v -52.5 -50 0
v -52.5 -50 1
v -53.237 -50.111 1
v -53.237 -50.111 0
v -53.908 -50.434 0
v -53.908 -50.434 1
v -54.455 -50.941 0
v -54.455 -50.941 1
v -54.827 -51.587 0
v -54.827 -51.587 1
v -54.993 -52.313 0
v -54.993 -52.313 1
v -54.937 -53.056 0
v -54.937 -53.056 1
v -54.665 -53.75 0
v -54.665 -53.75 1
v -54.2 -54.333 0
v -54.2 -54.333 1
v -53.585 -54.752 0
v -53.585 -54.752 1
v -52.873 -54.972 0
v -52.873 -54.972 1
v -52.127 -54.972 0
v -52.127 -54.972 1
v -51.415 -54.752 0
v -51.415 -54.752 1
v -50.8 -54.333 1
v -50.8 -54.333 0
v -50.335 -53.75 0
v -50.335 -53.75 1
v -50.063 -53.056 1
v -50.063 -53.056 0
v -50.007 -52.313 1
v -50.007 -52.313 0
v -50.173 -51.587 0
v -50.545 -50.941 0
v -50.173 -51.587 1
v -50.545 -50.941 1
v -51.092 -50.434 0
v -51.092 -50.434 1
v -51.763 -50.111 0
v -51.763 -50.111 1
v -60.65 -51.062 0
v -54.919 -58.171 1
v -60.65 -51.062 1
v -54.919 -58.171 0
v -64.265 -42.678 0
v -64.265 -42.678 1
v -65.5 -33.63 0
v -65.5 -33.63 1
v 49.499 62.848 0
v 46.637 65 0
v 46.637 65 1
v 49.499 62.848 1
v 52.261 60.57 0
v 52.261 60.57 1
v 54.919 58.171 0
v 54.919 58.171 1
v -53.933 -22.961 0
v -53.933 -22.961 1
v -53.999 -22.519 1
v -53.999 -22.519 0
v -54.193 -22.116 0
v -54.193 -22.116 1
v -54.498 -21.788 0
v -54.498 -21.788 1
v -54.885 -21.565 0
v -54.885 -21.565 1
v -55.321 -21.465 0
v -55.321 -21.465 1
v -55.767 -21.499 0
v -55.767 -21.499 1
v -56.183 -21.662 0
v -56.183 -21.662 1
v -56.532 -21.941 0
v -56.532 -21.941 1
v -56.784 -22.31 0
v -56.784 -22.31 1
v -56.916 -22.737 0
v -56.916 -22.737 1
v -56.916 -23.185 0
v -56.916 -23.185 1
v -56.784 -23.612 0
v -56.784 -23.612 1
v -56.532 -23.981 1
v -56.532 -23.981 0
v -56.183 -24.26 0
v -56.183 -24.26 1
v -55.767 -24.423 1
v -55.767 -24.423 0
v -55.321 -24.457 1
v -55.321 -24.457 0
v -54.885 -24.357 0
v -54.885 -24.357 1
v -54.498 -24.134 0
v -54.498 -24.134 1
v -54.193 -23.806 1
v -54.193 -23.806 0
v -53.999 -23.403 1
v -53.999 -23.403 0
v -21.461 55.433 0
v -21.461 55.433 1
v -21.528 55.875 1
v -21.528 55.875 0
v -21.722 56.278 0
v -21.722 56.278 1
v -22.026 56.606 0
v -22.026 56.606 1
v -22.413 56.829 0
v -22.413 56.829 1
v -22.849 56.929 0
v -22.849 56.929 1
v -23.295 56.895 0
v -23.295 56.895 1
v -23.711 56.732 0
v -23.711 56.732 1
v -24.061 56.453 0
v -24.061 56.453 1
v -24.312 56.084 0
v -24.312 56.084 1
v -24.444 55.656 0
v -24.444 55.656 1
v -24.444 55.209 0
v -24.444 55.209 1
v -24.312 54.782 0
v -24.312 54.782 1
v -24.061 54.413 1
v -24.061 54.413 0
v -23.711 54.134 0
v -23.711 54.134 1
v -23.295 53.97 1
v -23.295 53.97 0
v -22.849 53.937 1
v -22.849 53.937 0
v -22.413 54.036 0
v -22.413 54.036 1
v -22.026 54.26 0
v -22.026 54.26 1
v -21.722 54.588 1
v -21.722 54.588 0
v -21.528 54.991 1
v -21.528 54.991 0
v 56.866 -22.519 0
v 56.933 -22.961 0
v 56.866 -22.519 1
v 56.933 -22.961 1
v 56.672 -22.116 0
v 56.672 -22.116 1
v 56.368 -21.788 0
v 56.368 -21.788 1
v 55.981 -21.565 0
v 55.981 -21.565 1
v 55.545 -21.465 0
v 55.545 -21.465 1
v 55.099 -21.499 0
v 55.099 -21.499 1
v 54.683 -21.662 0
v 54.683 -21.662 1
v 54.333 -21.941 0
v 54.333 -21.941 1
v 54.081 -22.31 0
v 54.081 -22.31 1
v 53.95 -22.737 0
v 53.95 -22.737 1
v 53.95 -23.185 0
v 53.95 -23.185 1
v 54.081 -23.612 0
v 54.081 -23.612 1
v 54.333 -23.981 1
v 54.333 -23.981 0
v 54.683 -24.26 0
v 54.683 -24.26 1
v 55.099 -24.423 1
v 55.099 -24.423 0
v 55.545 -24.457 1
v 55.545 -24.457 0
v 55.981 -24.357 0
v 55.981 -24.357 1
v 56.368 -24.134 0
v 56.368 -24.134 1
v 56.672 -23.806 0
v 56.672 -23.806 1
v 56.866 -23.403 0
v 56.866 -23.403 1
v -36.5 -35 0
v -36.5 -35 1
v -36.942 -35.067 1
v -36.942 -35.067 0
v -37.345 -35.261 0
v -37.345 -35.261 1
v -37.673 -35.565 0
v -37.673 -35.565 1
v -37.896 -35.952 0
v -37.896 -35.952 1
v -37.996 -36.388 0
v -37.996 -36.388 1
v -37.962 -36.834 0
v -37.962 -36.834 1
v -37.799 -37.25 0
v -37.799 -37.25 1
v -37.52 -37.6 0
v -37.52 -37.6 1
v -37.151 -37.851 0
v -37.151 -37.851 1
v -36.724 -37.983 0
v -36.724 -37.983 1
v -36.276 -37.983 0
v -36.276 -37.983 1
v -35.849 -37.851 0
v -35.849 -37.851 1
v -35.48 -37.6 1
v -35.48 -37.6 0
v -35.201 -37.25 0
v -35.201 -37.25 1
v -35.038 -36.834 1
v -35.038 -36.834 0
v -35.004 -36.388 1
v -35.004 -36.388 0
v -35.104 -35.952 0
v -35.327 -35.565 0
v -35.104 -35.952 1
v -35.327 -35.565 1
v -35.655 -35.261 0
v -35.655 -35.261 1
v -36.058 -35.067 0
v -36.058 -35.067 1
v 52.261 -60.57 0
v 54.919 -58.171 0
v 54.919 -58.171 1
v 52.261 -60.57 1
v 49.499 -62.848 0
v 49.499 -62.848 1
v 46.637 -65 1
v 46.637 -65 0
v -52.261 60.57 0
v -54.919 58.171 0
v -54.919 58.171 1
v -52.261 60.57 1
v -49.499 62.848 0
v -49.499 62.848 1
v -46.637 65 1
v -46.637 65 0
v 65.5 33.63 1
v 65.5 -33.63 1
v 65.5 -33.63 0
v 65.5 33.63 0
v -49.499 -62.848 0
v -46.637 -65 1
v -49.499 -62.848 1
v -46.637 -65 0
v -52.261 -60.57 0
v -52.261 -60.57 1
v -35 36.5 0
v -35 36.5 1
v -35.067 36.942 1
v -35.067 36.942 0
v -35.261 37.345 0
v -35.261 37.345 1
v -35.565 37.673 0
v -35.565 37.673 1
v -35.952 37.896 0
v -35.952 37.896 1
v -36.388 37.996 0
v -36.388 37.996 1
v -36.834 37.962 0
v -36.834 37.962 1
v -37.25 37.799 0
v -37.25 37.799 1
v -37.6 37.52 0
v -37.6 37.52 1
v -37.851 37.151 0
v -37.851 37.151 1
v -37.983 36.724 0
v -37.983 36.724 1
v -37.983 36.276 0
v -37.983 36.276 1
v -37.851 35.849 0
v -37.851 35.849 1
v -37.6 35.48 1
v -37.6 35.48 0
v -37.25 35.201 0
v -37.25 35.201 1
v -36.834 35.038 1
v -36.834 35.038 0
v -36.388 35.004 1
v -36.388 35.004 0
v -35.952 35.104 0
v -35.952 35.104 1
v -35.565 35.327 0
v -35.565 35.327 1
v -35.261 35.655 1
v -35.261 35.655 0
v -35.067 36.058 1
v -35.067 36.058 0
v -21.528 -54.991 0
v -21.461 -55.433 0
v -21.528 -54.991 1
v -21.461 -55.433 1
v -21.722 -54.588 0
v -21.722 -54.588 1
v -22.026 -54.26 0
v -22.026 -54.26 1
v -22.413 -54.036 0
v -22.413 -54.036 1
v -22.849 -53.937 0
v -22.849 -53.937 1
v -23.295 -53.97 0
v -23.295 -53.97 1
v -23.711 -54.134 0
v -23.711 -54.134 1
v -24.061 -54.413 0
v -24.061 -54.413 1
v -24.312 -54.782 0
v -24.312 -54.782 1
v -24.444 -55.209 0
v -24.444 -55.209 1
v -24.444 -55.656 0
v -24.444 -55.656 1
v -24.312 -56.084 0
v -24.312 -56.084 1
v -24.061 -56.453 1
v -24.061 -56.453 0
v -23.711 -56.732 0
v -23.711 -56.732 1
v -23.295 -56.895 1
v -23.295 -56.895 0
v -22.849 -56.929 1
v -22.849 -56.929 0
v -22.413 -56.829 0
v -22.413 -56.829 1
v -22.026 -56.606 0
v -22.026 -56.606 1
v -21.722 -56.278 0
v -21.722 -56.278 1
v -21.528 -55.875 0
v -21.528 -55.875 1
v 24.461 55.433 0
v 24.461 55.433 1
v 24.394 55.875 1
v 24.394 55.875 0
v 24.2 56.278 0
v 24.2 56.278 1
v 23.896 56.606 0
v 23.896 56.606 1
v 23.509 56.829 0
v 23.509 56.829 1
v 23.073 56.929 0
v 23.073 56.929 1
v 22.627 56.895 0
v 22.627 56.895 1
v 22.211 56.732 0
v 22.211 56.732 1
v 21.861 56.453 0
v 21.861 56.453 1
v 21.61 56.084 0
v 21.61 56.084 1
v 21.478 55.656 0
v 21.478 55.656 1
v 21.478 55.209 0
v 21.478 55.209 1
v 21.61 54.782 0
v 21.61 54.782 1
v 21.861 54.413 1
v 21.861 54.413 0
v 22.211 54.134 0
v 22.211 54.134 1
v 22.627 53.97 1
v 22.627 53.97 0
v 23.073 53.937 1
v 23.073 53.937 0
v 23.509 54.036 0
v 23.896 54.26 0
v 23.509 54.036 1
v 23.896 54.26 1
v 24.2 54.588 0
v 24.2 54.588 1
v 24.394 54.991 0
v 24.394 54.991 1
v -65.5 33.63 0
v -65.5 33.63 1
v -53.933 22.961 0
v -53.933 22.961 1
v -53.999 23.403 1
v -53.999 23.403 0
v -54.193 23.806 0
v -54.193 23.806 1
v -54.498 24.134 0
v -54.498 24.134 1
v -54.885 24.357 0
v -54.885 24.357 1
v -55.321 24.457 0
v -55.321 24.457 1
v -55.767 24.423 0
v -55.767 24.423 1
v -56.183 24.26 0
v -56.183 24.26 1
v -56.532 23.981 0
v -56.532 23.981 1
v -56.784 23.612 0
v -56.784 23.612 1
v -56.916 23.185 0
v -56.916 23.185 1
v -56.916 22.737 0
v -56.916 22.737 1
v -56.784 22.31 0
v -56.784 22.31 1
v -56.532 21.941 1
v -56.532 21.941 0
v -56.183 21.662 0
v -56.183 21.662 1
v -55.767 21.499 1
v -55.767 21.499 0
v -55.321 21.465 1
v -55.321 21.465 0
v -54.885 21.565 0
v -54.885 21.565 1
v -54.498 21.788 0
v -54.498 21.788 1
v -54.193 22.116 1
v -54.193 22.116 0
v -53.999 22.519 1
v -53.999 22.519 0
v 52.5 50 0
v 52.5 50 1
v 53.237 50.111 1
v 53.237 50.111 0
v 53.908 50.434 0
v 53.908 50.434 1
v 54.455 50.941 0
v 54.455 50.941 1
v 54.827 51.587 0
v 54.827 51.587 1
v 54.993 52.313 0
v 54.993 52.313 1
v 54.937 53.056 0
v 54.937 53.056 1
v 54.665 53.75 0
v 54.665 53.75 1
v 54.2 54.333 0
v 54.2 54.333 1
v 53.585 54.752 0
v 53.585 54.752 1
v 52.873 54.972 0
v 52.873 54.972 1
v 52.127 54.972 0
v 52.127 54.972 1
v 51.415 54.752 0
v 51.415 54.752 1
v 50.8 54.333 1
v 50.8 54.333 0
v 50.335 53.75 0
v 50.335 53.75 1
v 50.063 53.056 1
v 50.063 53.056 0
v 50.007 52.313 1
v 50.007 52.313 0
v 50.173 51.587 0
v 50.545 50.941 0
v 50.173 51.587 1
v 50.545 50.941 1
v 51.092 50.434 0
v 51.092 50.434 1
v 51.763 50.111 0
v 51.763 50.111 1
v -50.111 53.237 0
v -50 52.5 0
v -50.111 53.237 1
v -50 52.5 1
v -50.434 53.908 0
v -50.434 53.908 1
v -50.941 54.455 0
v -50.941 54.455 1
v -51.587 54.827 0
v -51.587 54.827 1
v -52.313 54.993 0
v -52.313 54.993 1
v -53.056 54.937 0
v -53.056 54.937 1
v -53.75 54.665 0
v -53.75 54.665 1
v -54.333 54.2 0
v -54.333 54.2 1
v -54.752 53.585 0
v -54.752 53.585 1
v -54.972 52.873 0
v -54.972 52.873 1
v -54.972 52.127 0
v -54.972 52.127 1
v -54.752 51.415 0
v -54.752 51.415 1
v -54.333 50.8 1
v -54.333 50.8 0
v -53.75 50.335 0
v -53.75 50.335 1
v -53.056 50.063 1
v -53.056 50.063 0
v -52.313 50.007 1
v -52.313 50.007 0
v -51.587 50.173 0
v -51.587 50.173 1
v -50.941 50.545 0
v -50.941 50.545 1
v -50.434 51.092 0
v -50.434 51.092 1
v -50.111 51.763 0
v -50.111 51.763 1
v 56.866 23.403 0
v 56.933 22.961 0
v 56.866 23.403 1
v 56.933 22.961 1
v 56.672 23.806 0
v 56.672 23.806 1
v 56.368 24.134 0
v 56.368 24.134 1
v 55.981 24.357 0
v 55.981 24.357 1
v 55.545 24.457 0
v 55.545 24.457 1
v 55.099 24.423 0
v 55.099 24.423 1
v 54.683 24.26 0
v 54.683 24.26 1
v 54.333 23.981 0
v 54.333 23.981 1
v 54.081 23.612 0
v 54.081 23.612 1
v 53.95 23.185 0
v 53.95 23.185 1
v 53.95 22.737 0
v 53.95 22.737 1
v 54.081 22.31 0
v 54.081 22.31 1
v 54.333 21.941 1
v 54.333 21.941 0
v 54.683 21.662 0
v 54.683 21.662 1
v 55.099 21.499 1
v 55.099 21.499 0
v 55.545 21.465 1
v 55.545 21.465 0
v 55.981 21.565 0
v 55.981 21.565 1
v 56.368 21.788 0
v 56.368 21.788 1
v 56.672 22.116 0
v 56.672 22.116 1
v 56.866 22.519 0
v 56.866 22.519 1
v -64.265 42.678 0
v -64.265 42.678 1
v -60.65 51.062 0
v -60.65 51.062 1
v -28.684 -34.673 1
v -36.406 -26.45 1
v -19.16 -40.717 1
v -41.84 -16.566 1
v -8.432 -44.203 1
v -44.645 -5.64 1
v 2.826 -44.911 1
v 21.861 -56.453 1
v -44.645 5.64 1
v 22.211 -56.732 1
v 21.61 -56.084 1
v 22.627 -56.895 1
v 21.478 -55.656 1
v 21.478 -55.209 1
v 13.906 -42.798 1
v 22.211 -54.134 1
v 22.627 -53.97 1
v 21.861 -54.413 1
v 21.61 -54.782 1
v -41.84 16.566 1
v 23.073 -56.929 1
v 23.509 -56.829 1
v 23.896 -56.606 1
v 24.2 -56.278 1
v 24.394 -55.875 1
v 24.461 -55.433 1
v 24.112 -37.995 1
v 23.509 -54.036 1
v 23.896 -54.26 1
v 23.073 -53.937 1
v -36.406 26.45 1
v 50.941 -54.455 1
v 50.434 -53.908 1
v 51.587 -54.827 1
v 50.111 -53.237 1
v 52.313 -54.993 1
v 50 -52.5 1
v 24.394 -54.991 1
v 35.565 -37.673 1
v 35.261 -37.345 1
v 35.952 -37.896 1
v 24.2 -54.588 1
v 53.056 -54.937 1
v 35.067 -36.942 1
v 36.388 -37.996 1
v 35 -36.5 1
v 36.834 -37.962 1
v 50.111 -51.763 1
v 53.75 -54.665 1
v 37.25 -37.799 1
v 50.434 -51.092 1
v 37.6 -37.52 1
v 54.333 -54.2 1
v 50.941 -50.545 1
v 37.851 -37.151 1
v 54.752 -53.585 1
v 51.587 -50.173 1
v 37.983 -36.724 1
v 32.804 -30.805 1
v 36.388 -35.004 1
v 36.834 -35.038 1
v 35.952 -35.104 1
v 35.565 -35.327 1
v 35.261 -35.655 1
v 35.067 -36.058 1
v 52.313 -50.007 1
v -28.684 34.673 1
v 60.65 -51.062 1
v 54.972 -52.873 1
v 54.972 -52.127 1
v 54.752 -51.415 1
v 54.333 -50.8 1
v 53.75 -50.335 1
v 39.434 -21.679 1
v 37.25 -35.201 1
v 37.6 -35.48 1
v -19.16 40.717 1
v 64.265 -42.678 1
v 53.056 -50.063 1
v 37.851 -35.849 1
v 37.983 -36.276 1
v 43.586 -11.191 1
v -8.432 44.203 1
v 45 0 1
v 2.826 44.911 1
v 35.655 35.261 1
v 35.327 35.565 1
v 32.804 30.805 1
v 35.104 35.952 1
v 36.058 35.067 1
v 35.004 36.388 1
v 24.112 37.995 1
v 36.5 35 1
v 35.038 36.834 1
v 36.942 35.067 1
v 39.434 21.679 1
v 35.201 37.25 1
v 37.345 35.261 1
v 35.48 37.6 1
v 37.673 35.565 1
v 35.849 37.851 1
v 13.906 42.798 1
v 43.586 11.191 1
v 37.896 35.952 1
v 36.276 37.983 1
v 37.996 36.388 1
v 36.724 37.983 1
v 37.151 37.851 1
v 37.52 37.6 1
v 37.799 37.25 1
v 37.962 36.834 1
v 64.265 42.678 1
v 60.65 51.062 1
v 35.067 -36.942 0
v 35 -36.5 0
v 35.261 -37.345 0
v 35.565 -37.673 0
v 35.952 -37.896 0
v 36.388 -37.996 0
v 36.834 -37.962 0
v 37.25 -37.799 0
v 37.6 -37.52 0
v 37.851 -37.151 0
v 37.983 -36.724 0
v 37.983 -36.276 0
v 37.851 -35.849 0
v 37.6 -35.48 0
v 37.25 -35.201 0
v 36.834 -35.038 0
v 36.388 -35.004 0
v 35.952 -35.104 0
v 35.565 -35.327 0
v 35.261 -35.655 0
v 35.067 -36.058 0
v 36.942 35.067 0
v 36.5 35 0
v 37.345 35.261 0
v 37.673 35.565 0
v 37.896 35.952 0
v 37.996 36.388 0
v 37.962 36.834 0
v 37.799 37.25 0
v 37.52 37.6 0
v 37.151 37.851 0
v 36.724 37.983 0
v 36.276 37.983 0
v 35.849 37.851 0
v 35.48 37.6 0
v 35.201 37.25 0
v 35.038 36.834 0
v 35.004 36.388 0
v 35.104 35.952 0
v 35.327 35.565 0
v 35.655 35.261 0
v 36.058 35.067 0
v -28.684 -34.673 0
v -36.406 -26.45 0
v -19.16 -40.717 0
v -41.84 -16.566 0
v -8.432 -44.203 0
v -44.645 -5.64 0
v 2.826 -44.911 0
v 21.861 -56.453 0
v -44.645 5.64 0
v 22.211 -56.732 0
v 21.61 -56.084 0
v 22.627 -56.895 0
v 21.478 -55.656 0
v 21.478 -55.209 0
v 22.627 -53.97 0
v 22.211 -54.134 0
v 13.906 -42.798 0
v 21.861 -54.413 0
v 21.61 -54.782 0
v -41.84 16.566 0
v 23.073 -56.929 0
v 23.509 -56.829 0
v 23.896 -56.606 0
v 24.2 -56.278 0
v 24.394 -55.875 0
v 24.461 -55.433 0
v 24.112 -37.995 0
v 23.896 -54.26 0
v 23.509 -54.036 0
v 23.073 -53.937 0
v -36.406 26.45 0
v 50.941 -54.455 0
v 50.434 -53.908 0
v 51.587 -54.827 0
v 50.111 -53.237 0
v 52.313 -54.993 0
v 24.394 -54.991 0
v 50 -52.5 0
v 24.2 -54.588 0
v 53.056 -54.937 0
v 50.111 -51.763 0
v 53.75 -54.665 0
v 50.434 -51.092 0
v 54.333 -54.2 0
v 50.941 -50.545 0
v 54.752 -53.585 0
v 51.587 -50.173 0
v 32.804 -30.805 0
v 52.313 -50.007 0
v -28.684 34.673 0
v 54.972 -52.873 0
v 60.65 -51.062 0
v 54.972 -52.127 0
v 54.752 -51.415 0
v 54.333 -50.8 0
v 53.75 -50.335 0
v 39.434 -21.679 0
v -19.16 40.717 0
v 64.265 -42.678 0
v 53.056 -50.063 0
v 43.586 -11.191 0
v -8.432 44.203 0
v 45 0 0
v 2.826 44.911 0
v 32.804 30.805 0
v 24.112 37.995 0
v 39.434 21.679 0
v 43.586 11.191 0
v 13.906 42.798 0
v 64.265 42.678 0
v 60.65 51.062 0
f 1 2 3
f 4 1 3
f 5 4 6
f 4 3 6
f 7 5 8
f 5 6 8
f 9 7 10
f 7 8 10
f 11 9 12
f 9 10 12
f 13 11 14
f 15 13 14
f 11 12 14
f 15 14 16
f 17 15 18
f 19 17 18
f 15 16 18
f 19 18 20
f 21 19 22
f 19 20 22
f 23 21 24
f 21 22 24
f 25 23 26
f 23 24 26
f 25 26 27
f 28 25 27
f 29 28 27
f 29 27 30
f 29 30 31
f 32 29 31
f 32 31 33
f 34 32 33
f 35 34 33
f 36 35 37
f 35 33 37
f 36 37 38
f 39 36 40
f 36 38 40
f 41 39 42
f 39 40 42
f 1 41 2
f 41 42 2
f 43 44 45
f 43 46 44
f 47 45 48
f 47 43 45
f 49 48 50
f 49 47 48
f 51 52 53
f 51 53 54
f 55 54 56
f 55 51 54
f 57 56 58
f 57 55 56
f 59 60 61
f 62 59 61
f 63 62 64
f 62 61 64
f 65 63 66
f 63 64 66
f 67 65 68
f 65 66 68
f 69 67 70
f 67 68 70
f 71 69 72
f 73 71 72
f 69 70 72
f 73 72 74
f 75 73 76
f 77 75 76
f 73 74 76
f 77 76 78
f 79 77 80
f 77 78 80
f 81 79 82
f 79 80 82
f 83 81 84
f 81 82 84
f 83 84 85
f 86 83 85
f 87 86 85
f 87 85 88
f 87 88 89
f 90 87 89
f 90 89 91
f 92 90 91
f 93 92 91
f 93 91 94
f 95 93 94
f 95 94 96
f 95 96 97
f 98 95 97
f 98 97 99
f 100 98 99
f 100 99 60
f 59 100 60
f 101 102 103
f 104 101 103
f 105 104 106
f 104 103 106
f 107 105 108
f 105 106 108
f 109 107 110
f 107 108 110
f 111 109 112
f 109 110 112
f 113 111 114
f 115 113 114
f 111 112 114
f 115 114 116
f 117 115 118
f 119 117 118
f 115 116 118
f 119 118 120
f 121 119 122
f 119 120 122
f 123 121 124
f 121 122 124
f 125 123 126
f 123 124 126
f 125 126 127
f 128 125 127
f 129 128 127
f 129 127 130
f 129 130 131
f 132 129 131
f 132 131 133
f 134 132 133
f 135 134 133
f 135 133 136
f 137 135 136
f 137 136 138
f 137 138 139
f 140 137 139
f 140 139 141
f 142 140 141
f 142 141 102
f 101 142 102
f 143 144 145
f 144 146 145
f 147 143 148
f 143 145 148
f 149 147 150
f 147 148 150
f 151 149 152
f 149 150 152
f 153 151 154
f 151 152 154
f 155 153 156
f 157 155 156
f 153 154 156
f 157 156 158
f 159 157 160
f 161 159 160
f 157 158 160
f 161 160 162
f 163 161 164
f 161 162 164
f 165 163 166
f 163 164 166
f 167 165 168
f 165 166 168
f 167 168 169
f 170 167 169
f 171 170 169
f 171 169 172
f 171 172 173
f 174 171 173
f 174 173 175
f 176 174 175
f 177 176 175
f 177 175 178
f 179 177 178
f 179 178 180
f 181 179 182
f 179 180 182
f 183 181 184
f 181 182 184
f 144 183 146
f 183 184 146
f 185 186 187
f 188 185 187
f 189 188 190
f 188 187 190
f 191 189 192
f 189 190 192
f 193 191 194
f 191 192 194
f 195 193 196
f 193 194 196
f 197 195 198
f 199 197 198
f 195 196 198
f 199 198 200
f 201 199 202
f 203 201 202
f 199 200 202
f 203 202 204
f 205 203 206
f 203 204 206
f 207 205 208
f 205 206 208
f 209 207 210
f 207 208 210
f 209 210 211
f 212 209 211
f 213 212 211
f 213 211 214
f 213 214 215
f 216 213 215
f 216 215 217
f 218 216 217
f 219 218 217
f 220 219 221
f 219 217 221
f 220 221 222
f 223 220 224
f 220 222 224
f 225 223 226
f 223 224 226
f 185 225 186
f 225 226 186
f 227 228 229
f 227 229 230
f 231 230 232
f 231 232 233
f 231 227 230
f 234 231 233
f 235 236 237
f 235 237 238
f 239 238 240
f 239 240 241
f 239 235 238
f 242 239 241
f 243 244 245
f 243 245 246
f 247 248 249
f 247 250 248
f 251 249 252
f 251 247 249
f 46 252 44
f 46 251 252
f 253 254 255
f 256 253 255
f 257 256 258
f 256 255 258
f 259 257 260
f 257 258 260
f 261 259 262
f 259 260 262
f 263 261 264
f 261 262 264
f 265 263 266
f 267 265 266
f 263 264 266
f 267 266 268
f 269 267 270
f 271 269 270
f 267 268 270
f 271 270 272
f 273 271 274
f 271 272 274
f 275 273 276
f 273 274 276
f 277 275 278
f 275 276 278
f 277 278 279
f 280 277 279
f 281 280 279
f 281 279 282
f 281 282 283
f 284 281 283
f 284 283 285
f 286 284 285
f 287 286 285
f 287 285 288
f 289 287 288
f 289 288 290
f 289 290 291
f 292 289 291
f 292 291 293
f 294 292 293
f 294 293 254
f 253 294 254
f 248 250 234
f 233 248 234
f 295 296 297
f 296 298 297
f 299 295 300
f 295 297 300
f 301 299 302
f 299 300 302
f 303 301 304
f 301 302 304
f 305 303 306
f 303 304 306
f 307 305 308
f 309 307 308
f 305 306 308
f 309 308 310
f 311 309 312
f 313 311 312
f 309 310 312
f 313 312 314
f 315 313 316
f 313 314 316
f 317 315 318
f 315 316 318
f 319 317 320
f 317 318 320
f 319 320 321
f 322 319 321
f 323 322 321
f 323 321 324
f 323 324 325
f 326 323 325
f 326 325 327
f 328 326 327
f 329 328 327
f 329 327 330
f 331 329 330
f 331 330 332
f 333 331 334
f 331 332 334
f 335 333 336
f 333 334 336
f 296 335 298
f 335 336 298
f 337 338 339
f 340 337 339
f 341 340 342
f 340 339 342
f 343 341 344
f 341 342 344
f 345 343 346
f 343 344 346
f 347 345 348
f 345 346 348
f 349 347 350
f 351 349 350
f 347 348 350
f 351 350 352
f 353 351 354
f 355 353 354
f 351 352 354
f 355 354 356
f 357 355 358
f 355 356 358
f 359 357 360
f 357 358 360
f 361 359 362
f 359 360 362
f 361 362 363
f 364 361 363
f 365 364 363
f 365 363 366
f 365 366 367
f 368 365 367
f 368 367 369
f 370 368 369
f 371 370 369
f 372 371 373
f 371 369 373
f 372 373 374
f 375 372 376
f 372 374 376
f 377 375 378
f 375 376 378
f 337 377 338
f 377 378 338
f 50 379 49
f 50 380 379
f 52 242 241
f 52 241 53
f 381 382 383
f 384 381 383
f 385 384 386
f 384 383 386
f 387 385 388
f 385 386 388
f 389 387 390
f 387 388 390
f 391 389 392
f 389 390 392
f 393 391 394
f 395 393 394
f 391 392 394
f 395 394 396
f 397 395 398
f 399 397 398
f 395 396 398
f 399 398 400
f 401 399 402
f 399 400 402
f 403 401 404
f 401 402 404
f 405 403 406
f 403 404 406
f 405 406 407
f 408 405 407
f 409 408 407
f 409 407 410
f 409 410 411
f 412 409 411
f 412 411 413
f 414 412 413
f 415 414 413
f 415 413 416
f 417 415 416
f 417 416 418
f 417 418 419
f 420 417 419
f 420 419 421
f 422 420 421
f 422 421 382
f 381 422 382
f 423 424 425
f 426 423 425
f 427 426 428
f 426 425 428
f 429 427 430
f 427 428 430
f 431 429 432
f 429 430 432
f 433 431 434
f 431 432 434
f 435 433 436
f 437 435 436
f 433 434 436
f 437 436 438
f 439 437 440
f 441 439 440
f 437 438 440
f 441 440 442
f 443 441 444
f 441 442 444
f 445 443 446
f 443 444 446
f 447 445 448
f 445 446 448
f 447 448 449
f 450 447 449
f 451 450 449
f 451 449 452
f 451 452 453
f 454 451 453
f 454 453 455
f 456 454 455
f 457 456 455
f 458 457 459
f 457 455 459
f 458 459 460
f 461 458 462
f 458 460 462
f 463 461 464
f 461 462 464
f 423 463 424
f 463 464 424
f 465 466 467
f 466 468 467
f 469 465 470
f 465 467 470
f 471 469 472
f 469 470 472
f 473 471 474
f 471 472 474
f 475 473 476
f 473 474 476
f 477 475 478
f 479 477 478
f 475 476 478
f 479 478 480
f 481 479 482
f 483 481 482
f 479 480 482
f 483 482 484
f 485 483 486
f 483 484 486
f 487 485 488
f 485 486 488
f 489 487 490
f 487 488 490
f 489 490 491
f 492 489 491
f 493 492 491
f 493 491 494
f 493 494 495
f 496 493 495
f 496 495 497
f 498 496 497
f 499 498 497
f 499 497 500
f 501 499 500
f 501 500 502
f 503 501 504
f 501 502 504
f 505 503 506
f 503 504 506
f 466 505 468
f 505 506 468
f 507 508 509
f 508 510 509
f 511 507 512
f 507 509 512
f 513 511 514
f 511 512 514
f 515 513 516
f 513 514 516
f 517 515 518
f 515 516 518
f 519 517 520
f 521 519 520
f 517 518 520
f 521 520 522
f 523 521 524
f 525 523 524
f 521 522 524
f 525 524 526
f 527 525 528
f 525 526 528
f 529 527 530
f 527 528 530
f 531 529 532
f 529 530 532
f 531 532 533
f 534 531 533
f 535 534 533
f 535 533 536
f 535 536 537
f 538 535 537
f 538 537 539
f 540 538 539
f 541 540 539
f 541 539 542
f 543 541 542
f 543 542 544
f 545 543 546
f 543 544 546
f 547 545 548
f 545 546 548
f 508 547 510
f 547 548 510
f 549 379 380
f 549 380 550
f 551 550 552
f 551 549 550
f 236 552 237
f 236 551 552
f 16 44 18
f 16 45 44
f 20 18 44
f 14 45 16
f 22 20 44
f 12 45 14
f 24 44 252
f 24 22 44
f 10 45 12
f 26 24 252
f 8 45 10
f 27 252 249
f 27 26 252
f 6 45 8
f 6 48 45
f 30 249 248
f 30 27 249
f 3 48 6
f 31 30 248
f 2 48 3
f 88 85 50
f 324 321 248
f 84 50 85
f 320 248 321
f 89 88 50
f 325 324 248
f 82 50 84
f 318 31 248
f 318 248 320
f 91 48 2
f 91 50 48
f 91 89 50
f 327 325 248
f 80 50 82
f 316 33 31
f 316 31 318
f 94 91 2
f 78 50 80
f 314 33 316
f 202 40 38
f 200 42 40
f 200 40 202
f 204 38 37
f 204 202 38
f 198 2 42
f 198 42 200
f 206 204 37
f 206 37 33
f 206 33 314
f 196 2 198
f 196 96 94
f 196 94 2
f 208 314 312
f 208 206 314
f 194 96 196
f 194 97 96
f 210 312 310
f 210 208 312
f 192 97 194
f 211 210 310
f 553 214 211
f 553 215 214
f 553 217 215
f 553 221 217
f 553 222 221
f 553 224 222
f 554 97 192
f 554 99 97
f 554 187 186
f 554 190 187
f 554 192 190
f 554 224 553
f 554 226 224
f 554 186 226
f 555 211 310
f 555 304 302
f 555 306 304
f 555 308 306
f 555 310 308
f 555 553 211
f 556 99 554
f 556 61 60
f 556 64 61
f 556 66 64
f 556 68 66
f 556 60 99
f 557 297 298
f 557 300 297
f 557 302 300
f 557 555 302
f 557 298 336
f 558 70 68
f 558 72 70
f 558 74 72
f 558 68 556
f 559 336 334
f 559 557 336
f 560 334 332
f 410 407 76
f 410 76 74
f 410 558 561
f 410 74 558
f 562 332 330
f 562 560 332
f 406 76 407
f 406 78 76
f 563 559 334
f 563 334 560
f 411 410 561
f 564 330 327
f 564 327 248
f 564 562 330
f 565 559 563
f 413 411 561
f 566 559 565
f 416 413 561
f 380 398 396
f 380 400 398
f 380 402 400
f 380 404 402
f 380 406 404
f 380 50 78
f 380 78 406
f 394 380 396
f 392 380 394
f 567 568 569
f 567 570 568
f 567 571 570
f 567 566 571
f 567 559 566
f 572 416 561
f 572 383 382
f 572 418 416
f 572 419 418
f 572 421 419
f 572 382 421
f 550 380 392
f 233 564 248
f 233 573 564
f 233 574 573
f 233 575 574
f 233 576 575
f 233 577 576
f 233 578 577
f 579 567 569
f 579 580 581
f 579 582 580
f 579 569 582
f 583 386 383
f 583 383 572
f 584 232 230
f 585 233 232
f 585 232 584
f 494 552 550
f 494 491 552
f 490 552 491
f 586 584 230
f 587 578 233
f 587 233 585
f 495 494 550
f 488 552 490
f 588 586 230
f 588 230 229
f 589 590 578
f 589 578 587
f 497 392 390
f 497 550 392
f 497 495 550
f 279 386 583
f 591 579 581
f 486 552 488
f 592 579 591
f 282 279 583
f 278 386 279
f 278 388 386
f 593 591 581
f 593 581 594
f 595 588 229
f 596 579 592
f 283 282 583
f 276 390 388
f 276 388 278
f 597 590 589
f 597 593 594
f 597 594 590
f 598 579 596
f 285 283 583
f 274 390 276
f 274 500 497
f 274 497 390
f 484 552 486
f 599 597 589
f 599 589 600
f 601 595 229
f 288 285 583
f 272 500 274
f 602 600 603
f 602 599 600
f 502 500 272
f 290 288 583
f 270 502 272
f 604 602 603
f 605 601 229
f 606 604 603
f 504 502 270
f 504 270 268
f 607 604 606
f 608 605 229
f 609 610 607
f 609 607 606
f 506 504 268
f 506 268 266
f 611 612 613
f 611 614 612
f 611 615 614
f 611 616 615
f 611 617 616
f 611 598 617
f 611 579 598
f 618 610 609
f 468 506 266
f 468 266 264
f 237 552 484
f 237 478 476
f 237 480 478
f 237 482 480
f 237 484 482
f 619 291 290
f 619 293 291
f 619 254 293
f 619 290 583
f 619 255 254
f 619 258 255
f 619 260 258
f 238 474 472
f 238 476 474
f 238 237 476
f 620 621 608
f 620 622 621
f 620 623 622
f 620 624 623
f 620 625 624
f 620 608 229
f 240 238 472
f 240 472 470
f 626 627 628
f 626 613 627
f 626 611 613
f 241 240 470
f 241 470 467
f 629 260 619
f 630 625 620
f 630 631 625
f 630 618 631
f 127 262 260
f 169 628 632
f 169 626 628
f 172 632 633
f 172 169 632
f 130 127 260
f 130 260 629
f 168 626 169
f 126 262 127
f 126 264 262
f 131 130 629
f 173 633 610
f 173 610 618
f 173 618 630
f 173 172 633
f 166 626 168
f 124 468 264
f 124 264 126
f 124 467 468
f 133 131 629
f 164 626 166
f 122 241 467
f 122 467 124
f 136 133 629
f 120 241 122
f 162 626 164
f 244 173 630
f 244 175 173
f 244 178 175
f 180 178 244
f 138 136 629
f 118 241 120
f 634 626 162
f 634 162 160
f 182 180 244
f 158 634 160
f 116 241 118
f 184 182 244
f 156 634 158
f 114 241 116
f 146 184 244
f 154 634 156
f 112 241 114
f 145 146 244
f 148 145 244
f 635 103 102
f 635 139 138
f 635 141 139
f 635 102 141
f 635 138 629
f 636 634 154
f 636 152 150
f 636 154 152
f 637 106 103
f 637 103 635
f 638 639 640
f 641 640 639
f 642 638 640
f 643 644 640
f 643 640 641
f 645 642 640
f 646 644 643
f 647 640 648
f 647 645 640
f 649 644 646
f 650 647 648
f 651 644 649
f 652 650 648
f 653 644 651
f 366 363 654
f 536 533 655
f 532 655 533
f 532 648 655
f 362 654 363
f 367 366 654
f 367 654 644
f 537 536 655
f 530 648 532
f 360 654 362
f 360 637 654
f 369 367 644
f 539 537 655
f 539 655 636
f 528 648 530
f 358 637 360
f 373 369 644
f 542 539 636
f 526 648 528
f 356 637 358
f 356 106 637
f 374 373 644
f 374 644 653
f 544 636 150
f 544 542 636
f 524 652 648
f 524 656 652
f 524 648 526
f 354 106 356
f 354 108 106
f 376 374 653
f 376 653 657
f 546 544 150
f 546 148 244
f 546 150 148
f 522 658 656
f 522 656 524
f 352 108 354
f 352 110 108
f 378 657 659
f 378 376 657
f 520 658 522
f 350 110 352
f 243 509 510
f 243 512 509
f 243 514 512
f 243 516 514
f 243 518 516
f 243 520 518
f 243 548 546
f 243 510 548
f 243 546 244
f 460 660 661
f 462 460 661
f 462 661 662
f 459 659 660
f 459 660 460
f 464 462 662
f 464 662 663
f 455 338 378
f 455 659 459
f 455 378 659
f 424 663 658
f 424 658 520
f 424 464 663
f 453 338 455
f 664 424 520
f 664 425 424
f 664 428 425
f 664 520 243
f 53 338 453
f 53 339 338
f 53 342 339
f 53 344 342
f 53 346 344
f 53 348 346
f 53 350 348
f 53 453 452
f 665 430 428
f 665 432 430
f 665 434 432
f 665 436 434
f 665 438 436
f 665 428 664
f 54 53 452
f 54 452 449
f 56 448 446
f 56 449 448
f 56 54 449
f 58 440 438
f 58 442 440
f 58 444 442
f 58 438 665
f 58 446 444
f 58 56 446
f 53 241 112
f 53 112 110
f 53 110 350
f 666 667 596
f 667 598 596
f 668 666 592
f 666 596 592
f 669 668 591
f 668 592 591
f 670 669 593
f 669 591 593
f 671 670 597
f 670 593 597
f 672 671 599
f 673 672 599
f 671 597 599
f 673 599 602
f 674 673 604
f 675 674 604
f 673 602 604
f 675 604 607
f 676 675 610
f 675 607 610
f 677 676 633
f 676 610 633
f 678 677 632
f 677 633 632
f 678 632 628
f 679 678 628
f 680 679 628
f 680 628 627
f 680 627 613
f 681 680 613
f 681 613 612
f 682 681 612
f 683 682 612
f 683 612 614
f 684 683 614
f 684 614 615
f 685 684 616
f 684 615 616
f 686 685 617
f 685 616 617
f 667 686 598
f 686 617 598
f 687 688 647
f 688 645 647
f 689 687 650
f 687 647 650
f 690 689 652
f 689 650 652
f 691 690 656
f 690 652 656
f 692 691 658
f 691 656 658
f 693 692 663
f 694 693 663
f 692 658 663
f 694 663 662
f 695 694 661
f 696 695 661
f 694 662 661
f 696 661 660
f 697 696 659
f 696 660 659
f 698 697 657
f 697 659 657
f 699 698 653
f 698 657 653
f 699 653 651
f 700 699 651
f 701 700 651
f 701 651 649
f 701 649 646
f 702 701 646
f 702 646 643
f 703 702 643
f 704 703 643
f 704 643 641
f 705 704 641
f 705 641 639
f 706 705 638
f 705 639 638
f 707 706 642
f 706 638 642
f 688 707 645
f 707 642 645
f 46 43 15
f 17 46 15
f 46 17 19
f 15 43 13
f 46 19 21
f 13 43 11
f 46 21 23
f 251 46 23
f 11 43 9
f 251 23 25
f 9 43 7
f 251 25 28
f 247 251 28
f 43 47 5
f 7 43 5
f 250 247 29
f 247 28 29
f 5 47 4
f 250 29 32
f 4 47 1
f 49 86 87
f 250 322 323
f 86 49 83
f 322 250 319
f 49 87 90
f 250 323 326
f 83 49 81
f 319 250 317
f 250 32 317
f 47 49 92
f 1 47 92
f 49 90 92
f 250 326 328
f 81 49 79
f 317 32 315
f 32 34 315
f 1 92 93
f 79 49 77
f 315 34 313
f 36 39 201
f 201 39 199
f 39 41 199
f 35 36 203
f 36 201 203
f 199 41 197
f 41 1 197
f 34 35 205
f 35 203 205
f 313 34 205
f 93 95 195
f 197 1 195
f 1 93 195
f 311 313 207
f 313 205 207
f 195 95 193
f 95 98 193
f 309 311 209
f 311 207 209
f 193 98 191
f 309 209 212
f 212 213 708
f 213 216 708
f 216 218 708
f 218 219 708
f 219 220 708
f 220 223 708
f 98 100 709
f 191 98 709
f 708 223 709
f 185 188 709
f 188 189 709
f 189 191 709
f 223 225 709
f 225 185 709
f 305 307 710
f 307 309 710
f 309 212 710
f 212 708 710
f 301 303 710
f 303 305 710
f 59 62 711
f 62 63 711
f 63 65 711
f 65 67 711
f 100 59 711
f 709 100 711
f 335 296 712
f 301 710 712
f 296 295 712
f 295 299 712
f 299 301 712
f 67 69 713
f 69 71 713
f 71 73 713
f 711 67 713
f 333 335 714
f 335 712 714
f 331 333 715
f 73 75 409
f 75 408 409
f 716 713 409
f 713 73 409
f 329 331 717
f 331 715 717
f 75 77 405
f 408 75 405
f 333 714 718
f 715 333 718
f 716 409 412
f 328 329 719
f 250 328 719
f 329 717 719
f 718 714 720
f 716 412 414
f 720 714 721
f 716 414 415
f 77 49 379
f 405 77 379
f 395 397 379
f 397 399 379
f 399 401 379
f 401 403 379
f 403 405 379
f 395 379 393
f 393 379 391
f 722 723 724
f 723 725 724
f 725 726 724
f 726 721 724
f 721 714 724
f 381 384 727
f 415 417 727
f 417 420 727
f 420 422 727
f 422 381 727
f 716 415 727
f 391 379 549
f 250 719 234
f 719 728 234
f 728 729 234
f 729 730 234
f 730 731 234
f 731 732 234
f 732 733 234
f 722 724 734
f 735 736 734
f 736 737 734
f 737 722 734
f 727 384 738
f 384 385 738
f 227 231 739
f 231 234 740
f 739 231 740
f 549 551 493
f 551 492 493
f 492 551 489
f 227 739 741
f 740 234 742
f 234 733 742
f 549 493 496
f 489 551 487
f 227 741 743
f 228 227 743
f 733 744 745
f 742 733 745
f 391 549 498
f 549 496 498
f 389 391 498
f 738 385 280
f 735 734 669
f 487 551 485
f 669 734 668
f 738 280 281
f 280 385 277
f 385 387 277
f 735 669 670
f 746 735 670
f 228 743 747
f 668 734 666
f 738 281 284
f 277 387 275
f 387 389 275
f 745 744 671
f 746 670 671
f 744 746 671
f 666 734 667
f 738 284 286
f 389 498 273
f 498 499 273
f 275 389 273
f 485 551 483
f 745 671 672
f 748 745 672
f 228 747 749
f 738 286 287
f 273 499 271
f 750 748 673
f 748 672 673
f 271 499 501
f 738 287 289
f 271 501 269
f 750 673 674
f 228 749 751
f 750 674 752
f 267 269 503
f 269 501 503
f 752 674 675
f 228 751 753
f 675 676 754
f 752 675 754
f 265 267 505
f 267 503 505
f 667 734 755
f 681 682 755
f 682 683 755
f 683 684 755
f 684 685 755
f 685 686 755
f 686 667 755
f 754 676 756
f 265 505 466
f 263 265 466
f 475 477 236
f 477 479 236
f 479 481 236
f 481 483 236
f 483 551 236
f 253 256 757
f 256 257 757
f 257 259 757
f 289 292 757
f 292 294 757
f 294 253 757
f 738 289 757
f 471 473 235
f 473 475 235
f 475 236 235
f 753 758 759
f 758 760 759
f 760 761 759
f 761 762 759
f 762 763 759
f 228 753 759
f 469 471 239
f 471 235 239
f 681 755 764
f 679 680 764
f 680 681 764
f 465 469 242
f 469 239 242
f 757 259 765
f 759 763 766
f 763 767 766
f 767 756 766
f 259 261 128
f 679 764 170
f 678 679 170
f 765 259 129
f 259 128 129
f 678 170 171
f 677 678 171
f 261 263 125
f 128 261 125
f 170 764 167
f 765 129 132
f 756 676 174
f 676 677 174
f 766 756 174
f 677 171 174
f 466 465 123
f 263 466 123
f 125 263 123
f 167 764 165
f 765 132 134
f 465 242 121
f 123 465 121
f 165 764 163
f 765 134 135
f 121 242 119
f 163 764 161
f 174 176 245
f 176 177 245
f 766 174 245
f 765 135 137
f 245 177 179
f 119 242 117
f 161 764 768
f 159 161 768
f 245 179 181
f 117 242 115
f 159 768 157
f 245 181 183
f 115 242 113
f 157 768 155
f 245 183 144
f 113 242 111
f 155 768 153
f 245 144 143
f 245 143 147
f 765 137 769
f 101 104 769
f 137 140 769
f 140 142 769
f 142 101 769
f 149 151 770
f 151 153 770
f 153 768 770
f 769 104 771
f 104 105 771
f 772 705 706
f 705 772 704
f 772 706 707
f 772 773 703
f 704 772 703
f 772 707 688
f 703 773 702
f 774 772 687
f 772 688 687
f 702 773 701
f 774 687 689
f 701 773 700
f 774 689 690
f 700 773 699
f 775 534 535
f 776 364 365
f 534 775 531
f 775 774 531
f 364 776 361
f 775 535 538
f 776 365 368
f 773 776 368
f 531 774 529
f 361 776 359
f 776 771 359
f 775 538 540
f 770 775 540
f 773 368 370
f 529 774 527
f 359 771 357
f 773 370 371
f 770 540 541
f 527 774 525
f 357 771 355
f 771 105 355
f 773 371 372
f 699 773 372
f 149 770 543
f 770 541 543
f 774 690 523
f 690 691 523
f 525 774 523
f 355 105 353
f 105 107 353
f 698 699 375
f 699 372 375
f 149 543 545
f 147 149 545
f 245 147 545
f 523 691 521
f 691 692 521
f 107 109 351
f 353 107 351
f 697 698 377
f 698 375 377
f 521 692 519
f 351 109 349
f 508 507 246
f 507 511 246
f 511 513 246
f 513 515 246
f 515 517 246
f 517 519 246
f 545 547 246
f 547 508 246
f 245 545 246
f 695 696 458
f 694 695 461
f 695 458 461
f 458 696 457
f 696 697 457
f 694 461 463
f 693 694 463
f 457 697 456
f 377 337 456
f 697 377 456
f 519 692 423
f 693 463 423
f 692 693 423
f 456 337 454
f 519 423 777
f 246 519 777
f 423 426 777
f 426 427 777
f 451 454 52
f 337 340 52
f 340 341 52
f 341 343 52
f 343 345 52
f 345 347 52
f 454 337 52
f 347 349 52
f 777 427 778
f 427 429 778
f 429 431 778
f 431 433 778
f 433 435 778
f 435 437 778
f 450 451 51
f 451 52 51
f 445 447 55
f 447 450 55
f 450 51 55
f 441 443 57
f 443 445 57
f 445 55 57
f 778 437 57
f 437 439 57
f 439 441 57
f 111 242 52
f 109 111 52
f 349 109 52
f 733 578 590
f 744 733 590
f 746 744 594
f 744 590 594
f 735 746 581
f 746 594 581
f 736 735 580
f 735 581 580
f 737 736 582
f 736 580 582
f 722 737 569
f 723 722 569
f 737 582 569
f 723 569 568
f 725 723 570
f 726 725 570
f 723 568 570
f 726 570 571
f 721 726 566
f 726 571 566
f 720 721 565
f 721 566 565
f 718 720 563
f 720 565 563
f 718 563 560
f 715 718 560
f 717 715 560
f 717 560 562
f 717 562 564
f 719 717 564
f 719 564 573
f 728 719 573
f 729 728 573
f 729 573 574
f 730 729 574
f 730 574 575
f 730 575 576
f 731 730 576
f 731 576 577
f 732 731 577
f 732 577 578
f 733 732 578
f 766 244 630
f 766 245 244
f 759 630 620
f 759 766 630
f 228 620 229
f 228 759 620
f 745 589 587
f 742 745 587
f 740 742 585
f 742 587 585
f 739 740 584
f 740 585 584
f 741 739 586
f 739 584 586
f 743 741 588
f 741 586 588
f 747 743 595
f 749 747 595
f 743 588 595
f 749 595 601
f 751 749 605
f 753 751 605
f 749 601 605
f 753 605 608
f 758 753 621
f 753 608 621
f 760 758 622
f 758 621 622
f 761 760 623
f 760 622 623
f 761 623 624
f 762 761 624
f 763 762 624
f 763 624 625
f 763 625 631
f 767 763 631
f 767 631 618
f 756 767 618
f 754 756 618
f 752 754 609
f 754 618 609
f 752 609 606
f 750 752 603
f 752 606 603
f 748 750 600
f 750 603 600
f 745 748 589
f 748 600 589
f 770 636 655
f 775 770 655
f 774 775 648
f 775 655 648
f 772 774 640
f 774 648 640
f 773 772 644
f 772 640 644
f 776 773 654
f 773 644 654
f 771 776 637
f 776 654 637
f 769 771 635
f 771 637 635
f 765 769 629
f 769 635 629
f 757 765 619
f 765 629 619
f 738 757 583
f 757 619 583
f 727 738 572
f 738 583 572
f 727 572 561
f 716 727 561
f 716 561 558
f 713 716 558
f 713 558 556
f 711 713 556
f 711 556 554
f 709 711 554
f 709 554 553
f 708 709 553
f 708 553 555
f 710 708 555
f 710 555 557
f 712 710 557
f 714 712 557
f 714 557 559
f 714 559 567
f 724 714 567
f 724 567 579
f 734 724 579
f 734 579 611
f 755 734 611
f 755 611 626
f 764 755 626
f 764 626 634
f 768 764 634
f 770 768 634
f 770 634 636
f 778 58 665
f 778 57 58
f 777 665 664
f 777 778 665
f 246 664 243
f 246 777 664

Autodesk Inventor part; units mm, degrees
ref_plane "YZ Plane" through (0, 0, 0) normal (1, 0, 0) x (0, 1, 0)
ref_plane "XZ Plane" through (0, 0, 0) normal (0, 1, 0) x (-1, 0, 0)
ref_plane "XY Plane" through (0, 0, 0) normal (0, 0, 1) x (1, 0, 0)
sketch "스케치1" plane through (0, 0, 0) normal (0, 0, 1) x (1, 0, 0)
  circle A0 centre (0, 0) radius 60 construction
  line L0 (0, 0) -> (0, 95.3997)
  line L1 (0, 0) -> (-132.5472, 0)
  line L2 (52.5, 52.5) -> (-52.5, 52.5)
  line L3 (-52.5, 52.5) -> (-52.5, -52.5)
  line L4 (-52.5, -52.5) -> (52.5, -52.5)
  line L5 (52.5, -52.5) -> (52.5, 52.5)
  line L6 (52.5, 52.5) -> (-52.5, -52.5) construction
  line L7 (-52.5, 52.5) -> (52.5, -52.5) construction
  arc A1 (-46.6369, 65) -> (-46.6369, -65) centre (0, 0) ccw
  arc A2 (46.6369, -65) -> (46.6369, 65) centre (0, 0) ccw
  line L8 (-46.6369, 65) -> (46.6369, 65)
  line L9 (-46.6369, -65) -> (46.6369, -65)
  line L10 (0, 0) -> (104.7447, 43.3867)
  line L11 (0, 0) -> (113.3748, 0) construction
  circle A3 centre (55.4328, 22.961) radius 1.5
  dimension "d0" = 120
  dimension "d49" = 105
  dimension "d50" = 105
  dimension "d56" = 22.5
  dimension "d57" = 3
extrude "돌출1" add sketch "스케치1" along normal blind 1
sketch "스케치5" plane through (0, 0, 1) normal (0, 0, 1) x (1, 0, 0)
  arc A0 (46.6369, -65) -> (46.6369, 65) centre (0, 0) ccw projected
  circle A1 centre (55.4328, 22.961) radius 1.5 projected
  circle A2 centre (55.4328, 22.961) radius 1.5
  circle A3 centre (22.961, 55.4328) radius 1.5
  circle A4 centre (-22.961, 55.4328) radius 1.5
  circle A5 centre (-55.4328, 22.961) radius 1.5
  circle A6 centre (-55.4328, -22.961) radius 1.5
  circle A7 centre (-22.961, -55.4328) radius 1.5
  circle A8 centre (22.961, -55.4328) radius 1.5
  circle A9 centre (55.4328, -22.961) radius 1.5
  dimension "d60" = 360
extrude "돌출5" cut sketch "스케치5" against normal through all
sketch "스케치6" plane through (0, 0, 1) normal (0, 0, 1) x (1, 0, 0)
  arc A0 (-46.6369, 65) -> (-46.6369, -65) centre (0, 0) ccw projected
  line L0 (36.5, 36.5) -> (-36.5, 36.5) construction
  line L1 (-36.5, 36.5) -> (-36.5, -36.5) construction
  line L2 (-36.5, -36.5) -> (36.5, -36.5) construction
  line L3 (36.5, -36.5) -> (36.5, 36.5) construction
  line L4 (36.5, 36.5) -> (-36.5, -36.5) construction
  line L5 (-36.5, 36.5) -> (36.5, -36.5) construction
  circle A1 centre (-36.5, 36.5) radius 1.5
  dimension "d64" = 73
  dimension "d65" = 73
  dimension "d66" = 3
extrude "돌출6" cut sketch "스케치6" against normal through all
pattern_circular "원형 패턴1" count 4 over 360 about axis through (0, 0, 0) along (0, 0, 1) of "돌출6"
sketch "스케치7" plane through (0, 0, 1) normal (0, 0, 1) x (1, 0, 0)
  arc A0 (-46.6369, 65) -> (-46.6369, -65) centre (0, 0) ccw projected
  line L0 (52.5, 52.5) -> (-52.5, 52.5) construction
  line L1 (-52.5, 52.5) -> (-52.5, -52.5) construction
  line L2 (-52.5, -52.5) -> (52.5, -52.5) construction
  line L3 (52.5, -52.5) -> (52.5, 52.5) construction
  line L4 (52.5, 52.5) -> (-52.5, -52.5) construction
  line L5 (-52.5, 52.5) -> (52.5, -52.5) construction
  circle A1 centre (-52.5, 52.5) radius 2.5
  dimension "d72" = 105
  dimension "d73" = 105
  dimension "d74" = 5
extrude "돌출7" cut sketch "스케치7" against normal through all
pattern_circular "원형 패턴2" count 4 over 360 about axis through (0, 0, 0) along (0, 0, 1) of "돌출7"
sketch "스케치9" plane through (0, 0, 1) normal (0, 0, 1) x (1, 0, 0)
  arc A0 (-46.6369, 65) -> (-46.6369, -65) centre (0, 0) ccw projected
  line L0 (-34.8236, -59) -> (-59, -34.8236) projected
  line L1 (-59, -34.8236) -> (-59, 34.8236) projected
  line L2 (-59, 34.8236) -> (-34.8236, 59) projected
  line L3 (-34.8236, 59) -> (34.8236, 59) projected
  line L4 (34.8236, 59) -> (59, 34.8236) projected
  line L5 (59, 34.8236) -> (59, -34.8236) projected
  line L6 (59, -34.8236) -> (34.8236, -59) projected
  line L7 (34.8236, -59) -> (-34.8236, -59) projected
  circle A1 centre (52.5, -52.5) radius 2.5 projected
  circle A2 centre (-52.5, 52.5) radius 2.5 projected
  circle A3 centre (-52.5, -52.5) radius 2.5 projected
  circle A4 centre (52.5, 52.5) radius 2.5 projected
  line L8 (-84.5, -70.75) -> (65.5, -70.75) projected
  line L9 (65.5, -70.75) -> (65.5, 70.75) projected
  line L10 (65.5, 70.75) -> (-84.5, 70.75) projected
  line L11 (-84.5, 70.75) -> (-84.5, -70.75) projected
  circle A5 centre (0, 0) radius 45
  dimension "d80" = 90
extrude "돌출8" cut sketch "스케치9" against normal through all contours A5
sketch "스케치11" plane through (0, 0, 1) normal (0, 0, 1) x (1, 0, 0)
  line L0 (65.5, -70.75) -> (65.5, 70.75) projected
  line L1 (65.5, 70.75) -> (105.9964, 70.75)
  line L2 (105.9964, 70.75) -> (105.9964, -90.2742)
  line L3 (105.9964, -90.2742) -> (65.5, -90.2742)
  line L4 (65.5, -90.2742) -> (65.5, 70.75)
extrude "돌출9" cut sketch "스케치11" against normal through all
mirror "미러3" about plane through (0, 0, 0) normal (1, 0, 0) of "돌출9"
fillet "모깎기3" radius 33.75 4 edges at (65.5, 45.932, 0.5) (65.5, -45.932, 0.5) (-65.5, -45.932, 0.5) (-65.5, 45.932, 0.5)
properties part number "모터드라이버 지지대 철판가공"
